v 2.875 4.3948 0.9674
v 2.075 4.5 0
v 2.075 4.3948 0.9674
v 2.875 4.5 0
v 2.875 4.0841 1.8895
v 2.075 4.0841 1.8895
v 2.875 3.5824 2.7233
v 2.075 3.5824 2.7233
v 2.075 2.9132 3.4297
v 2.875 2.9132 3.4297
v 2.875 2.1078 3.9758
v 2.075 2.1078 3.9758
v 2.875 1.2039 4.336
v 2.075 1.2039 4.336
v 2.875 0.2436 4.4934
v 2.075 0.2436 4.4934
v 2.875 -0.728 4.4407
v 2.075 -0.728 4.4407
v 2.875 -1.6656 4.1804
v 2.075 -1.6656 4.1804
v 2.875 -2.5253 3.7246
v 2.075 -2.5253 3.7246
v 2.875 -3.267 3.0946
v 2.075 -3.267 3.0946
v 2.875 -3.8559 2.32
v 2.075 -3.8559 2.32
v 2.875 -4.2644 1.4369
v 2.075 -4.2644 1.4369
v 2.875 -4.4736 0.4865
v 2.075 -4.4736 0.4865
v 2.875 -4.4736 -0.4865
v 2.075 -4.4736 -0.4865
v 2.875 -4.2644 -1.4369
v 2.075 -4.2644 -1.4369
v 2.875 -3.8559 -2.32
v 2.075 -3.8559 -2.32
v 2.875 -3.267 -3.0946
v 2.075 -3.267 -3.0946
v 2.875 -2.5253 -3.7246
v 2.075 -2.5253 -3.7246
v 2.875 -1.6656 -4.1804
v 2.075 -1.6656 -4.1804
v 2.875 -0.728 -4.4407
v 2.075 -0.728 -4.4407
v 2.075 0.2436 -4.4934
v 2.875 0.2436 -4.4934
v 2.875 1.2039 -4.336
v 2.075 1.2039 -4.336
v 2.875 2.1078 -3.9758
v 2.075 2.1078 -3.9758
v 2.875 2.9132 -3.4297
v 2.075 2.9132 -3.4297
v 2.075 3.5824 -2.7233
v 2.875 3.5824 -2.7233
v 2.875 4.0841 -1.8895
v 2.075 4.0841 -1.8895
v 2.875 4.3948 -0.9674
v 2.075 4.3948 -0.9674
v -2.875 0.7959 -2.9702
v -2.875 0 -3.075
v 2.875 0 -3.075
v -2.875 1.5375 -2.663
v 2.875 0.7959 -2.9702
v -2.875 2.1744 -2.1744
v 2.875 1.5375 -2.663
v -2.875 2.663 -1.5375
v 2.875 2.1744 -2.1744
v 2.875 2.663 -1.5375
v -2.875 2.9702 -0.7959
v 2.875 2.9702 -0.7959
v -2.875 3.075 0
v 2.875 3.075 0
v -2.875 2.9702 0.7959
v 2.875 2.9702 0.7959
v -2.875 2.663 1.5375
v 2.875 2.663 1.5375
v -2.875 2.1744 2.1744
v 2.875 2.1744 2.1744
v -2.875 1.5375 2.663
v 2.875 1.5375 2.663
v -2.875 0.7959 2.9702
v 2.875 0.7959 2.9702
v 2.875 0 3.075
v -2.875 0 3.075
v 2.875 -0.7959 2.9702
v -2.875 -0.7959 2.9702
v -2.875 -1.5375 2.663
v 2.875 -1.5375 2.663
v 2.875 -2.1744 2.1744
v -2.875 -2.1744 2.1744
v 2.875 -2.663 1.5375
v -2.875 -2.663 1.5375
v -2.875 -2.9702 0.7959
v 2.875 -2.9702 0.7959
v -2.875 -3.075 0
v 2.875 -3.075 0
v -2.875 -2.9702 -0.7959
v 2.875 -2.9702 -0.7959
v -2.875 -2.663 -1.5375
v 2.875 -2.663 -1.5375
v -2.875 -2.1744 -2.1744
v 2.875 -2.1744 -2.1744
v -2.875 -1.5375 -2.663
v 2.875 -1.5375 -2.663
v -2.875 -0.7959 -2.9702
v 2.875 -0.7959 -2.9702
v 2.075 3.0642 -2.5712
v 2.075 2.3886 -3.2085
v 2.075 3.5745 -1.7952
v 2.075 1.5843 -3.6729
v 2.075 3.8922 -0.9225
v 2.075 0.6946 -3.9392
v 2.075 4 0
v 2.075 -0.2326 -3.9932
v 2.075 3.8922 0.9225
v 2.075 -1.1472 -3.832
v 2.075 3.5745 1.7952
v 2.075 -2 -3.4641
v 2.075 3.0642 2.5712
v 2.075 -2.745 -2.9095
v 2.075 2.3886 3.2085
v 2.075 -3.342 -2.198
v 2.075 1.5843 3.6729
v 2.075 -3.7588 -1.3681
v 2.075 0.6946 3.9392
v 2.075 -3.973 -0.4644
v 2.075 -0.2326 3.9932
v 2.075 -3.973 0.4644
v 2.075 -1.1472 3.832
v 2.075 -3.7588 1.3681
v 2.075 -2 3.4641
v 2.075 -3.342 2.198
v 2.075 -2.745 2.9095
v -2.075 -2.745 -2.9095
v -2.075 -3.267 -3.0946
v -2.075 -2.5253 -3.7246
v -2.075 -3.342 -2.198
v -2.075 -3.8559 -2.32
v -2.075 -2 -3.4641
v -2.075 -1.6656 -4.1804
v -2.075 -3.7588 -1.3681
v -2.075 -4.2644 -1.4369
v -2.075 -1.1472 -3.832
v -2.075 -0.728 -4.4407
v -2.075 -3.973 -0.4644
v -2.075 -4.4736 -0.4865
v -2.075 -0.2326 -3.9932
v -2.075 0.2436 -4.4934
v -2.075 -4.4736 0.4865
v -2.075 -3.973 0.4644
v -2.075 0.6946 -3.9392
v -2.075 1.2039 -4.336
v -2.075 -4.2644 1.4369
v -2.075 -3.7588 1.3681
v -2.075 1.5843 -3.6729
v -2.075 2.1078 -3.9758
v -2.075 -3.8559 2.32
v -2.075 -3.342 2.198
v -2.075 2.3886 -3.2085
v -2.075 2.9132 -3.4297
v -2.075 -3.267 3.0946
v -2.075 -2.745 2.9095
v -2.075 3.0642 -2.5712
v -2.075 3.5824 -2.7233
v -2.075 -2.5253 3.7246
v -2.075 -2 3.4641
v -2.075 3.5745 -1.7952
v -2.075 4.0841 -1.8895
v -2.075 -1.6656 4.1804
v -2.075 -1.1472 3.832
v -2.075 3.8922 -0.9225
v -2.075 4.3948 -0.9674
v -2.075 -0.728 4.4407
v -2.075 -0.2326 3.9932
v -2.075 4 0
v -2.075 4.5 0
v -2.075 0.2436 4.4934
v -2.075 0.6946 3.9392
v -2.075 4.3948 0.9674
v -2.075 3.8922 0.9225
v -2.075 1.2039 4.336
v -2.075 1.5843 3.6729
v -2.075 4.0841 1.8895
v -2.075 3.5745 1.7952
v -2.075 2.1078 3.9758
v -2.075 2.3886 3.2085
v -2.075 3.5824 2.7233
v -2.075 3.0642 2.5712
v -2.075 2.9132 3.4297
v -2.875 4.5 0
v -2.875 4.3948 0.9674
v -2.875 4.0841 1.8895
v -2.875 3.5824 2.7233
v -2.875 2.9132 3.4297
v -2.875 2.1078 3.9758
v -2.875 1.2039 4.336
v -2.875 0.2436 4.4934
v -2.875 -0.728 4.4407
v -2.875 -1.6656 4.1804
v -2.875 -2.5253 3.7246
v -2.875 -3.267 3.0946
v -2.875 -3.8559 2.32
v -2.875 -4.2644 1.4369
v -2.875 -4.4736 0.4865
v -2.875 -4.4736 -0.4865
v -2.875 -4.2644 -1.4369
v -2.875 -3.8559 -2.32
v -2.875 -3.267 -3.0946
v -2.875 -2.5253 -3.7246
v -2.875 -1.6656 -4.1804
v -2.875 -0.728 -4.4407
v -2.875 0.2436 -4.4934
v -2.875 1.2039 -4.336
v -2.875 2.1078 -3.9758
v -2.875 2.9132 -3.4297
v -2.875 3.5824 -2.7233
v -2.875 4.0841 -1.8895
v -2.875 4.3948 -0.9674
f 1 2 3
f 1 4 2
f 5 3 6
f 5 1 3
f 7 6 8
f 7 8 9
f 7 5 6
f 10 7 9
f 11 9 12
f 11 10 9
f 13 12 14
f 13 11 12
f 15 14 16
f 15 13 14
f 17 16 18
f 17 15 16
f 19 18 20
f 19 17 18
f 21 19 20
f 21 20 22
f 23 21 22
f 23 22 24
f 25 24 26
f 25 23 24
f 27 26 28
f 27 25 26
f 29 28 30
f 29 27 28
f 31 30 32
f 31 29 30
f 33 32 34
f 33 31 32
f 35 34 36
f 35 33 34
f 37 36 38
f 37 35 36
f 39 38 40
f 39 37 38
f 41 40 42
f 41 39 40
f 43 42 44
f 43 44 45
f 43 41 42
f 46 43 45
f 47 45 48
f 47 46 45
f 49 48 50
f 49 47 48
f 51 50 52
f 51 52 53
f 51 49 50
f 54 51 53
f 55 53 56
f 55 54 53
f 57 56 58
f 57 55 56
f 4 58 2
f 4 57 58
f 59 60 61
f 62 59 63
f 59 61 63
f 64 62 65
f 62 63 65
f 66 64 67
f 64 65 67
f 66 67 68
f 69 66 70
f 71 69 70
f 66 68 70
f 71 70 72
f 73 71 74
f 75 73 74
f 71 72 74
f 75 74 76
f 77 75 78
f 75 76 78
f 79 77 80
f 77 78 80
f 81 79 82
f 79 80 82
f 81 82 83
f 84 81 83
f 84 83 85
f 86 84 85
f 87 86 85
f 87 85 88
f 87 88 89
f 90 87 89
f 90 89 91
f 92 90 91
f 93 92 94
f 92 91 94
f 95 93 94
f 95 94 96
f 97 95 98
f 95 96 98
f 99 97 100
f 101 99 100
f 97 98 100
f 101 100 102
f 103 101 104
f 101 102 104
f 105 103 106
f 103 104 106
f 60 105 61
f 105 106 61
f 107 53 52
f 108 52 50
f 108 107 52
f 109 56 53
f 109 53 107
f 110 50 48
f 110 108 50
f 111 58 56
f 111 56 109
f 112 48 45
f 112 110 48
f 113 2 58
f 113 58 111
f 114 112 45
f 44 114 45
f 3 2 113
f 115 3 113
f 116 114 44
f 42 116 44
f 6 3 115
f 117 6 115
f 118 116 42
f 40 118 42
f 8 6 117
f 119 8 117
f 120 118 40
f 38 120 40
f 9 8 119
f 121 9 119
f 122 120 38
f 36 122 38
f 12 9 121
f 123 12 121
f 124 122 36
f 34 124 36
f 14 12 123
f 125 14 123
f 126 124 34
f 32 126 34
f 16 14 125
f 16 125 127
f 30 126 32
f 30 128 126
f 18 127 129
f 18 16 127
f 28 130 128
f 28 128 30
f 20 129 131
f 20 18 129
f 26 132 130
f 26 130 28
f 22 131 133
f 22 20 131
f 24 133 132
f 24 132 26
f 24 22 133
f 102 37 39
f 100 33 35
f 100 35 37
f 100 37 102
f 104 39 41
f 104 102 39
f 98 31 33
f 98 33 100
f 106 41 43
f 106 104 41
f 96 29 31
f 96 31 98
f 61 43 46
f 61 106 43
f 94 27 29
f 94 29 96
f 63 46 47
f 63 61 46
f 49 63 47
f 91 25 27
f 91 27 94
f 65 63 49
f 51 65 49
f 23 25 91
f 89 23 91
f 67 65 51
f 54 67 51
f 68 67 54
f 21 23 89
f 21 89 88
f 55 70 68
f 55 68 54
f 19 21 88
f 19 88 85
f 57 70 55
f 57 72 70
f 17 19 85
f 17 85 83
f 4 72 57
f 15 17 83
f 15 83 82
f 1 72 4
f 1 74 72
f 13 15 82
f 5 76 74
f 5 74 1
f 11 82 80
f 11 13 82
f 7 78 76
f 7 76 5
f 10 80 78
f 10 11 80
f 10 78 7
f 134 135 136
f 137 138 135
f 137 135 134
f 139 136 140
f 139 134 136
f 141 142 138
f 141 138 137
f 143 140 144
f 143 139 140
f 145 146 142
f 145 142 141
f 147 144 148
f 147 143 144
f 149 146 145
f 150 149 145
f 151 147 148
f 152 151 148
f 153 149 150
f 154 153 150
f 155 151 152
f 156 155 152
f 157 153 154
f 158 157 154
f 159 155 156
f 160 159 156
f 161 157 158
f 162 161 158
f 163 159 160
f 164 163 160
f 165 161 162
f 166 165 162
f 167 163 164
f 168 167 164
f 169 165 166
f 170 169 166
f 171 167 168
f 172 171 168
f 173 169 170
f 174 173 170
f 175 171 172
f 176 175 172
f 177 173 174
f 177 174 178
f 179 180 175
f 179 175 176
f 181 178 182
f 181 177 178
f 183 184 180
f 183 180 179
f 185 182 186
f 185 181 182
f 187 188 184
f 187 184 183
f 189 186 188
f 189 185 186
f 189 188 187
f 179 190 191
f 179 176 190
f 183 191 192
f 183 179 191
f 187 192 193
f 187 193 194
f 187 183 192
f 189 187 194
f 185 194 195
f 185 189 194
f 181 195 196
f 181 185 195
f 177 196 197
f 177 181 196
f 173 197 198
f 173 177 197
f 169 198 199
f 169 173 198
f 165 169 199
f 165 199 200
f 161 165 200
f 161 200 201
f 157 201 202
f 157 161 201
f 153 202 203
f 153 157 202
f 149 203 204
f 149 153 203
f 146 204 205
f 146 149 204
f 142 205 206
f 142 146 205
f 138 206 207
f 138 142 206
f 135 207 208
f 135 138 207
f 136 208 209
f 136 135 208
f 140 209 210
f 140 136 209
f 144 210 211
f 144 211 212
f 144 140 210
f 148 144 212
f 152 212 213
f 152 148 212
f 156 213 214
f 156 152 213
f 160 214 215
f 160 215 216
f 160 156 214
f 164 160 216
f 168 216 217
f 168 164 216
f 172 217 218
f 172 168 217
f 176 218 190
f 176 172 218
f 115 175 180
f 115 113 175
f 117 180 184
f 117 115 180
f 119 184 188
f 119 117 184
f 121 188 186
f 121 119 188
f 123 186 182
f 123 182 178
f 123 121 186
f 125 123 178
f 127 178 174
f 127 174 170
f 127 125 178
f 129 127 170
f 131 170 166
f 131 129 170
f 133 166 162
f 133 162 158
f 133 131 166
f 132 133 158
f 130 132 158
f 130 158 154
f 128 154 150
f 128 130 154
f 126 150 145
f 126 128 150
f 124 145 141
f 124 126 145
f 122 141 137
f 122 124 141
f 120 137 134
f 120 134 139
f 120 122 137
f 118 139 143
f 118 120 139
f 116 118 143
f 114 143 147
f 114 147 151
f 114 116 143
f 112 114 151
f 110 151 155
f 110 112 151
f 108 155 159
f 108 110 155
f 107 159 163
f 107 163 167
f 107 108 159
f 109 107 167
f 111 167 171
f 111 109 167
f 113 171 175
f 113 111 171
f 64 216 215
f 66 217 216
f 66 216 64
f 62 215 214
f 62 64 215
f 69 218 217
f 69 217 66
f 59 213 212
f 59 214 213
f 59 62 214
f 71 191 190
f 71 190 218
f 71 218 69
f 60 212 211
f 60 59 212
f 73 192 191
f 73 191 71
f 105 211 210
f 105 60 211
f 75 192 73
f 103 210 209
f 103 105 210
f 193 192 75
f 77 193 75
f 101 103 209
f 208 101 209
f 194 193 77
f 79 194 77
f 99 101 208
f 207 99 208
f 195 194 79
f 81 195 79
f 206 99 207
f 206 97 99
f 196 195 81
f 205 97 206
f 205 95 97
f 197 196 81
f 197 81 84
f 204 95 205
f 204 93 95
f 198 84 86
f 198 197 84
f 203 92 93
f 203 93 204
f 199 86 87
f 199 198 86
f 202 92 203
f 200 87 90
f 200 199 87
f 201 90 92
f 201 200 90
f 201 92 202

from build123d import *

# Parameters (mm, degrees)
SKETCH3_R               = 3.075
CUT_EXTRUDE1_DEPTH      = 3.875
CUT_EXTRUDE1_DEPTH_BACK = 3.875


with BuildPart() as part:
    # Sketch1 → Revolve1 (revolve)
    with BuildSketch(Plane.XY):
        Polygon((-2.875, 1.5), (-2.875, 4.5), (-2.075, 4.5), (-2.075, 4), (2.075, 4), (2.075, 4.5), (2.875, 4.5), (2.875, 1.5), align=None)
    revolve(axis=Axis((0, 0, 0), (1, 0, 0)))

    # Sketch3 → Cut-Extrude1 (cut, two sides)
    with BuildSketch(Plane(origin=(0, 0, 0), x_dir=(0, 0, -1), z_dir=(1, 0, 0))) as cut_extrude1_sk:
        Circle(SKETCH3_R)
    extrude(amount=CUT_EXTRUDE1_DEPTH, mode=Mode.SUBTRACT)
    extrude(cut_extrude1_sk.sketch, amount=-CUT_EXTRUDE1_DEPTH_BACK, mode=Mode.SUBTRACT)


solid = part.part
